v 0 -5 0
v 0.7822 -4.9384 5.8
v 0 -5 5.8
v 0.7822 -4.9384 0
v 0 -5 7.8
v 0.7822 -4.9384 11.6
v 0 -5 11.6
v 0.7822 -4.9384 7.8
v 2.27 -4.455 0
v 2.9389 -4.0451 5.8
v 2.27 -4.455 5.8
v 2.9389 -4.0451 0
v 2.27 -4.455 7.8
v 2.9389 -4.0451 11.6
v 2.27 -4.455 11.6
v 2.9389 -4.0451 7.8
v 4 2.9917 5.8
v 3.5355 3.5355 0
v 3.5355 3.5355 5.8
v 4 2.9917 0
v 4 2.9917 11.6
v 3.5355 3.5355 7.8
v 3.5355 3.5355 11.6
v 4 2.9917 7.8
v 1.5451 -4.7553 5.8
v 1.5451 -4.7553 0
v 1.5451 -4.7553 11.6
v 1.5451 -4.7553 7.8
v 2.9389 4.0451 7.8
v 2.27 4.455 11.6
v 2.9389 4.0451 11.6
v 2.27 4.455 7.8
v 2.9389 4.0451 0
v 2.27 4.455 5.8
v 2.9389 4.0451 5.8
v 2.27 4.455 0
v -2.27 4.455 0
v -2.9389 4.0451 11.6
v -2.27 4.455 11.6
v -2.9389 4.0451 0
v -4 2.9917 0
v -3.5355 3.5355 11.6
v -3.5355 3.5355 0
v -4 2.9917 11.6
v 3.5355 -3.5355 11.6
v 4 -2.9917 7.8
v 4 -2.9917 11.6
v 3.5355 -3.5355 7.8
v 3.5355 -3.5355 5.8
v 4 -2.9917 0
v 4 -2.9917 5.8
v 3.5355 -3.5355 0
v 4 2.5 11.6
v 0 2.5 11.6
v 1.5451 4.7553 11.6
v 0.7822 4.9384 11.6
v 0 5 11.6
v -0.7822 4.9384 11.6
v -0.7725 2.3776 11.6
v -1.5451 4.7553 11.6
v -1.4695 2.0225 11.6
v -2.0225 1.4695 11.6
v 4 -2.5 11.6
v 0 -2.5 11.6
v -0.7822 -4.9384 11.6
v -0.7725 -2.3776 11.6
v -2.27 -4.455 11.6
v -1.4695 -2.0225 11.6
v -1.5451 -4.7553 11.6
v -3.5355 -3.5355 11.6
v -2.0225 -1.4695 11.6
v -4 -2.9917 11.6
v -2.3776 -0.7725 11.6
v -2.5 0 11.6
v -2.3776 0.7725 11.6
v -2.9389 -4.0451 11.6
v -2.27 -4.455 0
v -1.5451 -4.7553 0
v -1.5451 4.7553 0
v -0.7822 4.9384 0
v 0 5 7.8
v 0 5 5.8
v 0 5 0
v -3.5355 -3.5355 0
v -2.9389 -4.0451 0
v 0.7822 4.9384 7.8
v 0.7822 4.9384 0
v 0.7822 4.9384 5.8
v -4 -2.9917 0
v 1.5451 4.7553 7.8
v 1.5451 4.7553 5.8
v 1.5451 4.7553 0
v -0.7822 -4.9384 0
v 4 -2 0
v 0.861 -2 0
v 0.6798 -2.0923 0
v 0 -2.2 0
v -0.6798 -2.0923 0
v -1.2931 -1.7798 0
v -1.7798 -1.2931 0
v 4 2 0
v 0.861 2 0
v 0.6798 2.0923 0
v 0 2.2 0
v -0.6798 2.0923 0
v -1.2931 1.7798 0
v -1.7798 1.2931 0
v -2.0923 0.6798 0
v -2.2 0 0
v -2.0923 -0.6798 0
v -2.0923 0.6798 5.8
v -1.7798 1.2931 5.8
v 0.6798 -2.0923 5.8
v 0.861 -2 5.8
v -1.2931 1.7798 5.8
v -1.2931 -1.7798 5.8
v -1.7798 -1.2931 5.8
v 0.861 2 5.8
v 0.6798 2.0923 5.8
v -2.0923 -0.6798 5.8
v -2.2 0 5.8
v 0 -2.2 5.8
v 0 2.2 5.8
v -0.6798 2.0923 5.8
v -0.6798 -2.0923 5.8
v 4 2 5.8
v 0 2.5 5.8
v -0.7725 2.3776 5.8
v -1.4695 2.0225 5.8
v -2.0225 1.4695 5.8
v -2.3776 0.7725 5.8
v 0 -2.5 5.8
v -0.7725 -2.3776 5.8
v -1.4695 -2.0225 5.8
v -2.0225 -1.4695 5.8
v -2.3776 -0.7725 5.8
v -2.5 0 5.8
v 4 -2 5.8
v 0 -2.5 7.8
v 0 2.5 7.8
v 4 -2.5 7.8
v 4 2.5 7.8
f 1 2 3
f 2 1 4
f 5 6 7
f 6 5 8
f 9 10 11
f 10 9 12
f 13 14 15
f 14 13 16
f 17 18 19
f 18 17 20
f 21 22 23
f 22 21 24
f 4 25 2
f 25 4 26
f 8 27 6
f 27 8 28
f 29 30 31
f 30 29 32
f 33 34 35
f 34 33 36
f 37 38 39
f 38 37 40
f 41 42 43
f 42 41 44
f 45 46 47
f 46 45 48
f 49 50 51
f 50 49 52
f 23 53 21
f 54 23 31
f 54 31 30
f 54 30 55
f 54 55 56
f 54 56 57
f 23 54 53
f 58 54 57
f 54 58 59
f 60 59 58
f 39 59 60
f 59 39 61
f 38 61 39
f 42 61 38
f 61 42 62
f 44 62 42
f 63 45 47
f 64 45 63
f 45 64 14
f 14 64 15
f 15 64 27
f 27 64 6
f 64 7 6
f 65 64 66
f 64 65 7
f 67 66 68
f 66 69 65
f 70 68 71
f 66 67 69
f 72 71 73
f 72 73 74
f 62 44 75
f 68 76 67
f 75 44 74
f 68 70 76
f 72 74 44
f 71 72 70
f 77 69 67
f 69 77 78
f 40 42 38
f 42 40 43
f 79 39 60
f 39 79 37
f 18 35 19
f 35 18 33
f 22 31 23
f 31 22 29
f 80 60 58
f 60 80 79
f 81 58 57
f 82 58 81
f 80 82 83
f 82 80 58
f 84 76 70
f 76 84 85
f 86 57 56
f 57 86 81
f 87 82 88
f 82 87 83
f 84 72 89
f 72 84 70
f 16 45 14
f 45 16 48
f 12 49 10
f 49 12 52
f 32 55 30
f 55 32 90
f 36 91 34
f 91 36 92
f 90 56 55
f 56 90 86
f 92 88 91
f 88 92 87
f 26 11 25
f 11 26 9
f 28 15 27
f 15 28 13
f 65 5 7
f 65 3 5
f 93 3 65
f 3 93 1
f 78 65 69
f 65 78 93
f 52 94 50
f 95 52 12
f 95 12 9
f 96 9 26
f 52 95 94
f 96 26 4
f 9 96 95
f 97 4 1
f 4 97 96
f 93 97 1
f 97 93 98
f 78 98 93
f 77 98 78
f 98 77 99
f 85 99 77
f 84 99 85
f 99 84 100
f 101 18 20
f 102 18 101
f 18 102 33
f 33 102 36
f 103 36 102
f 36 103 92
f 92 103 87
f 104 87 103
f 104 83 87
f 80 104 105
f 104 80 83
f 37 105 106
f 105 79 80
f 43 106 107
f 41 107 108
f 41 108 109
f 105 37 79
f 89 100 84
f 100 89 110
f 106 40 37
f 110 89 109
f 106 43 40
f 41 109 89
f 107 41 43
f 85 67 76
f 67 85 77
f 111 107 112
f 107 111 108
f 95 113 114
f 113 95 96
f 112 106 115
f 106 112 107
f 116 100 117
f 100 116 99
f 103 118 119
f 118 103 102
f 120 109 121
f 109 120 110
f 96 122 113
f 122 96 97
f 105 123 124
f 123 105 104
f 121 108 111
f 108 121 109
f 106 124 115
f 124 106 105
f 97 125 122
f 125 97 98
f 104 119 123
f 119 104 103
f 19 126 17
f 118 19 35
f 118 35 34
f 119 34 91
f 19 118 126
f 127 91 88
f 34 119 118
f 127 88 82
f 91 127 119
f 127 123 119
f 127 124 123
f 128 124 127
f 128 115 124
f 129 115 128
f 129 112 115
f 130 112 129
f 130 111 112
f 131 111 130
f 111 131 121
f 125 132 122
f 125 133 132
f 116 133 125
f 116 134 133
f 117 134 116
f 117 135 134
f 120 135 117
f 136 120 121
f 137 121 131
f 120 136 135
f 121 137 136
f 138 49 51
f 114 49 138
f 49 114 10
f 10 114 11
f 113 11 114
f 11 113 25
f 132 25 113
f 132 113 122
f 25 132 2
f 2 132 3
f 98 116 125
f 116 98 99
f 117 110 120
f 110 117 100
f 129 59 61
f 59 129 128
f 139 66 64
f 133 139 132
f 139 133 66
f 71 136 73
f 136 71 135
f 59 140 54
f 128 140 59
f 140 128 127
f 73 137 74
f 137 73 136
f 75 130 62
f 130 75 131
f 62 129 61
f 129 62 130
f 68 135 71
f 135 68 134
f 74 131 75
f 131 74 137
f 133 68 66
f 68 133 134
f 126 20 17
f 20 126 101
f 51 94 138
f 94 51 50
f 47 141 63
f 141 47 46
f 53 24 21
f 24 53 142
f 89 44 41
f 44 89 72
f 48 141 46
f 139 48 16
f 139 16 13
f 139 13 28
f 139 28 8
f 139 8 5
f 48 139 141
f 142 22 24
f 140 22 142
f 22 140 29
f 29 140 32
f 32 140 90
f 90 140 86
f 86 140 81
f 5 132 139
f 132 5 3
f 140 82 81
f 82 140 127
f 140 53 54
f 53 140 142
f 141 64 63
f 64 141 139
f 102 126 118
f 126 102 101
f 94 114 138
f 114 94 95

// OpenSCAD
module sadapt(){
difference(){
cylinder(h = 5.8*2, d = 10, $fn = 40); 

cylinder(h = 5.8, d = 4.4, $fn=20);
    translate([0,0,5.8]) cylinder(h = 5.8, d = 5, $fn = 20);
    translate([4, -10, 0]) cube(20); 
translate([-4 - 20, -10, 0]) cube(20); 
    
     translate([0, -10, 5.8]) cube([20, 20, 2]); 
    translate([0, -2.5, 5.8]) cube([5, 5, 20]); 
    translate([0, -2, -20+5.8]) cube([4, 4, 20]); 
    }
   
    }


sadapt(); 
